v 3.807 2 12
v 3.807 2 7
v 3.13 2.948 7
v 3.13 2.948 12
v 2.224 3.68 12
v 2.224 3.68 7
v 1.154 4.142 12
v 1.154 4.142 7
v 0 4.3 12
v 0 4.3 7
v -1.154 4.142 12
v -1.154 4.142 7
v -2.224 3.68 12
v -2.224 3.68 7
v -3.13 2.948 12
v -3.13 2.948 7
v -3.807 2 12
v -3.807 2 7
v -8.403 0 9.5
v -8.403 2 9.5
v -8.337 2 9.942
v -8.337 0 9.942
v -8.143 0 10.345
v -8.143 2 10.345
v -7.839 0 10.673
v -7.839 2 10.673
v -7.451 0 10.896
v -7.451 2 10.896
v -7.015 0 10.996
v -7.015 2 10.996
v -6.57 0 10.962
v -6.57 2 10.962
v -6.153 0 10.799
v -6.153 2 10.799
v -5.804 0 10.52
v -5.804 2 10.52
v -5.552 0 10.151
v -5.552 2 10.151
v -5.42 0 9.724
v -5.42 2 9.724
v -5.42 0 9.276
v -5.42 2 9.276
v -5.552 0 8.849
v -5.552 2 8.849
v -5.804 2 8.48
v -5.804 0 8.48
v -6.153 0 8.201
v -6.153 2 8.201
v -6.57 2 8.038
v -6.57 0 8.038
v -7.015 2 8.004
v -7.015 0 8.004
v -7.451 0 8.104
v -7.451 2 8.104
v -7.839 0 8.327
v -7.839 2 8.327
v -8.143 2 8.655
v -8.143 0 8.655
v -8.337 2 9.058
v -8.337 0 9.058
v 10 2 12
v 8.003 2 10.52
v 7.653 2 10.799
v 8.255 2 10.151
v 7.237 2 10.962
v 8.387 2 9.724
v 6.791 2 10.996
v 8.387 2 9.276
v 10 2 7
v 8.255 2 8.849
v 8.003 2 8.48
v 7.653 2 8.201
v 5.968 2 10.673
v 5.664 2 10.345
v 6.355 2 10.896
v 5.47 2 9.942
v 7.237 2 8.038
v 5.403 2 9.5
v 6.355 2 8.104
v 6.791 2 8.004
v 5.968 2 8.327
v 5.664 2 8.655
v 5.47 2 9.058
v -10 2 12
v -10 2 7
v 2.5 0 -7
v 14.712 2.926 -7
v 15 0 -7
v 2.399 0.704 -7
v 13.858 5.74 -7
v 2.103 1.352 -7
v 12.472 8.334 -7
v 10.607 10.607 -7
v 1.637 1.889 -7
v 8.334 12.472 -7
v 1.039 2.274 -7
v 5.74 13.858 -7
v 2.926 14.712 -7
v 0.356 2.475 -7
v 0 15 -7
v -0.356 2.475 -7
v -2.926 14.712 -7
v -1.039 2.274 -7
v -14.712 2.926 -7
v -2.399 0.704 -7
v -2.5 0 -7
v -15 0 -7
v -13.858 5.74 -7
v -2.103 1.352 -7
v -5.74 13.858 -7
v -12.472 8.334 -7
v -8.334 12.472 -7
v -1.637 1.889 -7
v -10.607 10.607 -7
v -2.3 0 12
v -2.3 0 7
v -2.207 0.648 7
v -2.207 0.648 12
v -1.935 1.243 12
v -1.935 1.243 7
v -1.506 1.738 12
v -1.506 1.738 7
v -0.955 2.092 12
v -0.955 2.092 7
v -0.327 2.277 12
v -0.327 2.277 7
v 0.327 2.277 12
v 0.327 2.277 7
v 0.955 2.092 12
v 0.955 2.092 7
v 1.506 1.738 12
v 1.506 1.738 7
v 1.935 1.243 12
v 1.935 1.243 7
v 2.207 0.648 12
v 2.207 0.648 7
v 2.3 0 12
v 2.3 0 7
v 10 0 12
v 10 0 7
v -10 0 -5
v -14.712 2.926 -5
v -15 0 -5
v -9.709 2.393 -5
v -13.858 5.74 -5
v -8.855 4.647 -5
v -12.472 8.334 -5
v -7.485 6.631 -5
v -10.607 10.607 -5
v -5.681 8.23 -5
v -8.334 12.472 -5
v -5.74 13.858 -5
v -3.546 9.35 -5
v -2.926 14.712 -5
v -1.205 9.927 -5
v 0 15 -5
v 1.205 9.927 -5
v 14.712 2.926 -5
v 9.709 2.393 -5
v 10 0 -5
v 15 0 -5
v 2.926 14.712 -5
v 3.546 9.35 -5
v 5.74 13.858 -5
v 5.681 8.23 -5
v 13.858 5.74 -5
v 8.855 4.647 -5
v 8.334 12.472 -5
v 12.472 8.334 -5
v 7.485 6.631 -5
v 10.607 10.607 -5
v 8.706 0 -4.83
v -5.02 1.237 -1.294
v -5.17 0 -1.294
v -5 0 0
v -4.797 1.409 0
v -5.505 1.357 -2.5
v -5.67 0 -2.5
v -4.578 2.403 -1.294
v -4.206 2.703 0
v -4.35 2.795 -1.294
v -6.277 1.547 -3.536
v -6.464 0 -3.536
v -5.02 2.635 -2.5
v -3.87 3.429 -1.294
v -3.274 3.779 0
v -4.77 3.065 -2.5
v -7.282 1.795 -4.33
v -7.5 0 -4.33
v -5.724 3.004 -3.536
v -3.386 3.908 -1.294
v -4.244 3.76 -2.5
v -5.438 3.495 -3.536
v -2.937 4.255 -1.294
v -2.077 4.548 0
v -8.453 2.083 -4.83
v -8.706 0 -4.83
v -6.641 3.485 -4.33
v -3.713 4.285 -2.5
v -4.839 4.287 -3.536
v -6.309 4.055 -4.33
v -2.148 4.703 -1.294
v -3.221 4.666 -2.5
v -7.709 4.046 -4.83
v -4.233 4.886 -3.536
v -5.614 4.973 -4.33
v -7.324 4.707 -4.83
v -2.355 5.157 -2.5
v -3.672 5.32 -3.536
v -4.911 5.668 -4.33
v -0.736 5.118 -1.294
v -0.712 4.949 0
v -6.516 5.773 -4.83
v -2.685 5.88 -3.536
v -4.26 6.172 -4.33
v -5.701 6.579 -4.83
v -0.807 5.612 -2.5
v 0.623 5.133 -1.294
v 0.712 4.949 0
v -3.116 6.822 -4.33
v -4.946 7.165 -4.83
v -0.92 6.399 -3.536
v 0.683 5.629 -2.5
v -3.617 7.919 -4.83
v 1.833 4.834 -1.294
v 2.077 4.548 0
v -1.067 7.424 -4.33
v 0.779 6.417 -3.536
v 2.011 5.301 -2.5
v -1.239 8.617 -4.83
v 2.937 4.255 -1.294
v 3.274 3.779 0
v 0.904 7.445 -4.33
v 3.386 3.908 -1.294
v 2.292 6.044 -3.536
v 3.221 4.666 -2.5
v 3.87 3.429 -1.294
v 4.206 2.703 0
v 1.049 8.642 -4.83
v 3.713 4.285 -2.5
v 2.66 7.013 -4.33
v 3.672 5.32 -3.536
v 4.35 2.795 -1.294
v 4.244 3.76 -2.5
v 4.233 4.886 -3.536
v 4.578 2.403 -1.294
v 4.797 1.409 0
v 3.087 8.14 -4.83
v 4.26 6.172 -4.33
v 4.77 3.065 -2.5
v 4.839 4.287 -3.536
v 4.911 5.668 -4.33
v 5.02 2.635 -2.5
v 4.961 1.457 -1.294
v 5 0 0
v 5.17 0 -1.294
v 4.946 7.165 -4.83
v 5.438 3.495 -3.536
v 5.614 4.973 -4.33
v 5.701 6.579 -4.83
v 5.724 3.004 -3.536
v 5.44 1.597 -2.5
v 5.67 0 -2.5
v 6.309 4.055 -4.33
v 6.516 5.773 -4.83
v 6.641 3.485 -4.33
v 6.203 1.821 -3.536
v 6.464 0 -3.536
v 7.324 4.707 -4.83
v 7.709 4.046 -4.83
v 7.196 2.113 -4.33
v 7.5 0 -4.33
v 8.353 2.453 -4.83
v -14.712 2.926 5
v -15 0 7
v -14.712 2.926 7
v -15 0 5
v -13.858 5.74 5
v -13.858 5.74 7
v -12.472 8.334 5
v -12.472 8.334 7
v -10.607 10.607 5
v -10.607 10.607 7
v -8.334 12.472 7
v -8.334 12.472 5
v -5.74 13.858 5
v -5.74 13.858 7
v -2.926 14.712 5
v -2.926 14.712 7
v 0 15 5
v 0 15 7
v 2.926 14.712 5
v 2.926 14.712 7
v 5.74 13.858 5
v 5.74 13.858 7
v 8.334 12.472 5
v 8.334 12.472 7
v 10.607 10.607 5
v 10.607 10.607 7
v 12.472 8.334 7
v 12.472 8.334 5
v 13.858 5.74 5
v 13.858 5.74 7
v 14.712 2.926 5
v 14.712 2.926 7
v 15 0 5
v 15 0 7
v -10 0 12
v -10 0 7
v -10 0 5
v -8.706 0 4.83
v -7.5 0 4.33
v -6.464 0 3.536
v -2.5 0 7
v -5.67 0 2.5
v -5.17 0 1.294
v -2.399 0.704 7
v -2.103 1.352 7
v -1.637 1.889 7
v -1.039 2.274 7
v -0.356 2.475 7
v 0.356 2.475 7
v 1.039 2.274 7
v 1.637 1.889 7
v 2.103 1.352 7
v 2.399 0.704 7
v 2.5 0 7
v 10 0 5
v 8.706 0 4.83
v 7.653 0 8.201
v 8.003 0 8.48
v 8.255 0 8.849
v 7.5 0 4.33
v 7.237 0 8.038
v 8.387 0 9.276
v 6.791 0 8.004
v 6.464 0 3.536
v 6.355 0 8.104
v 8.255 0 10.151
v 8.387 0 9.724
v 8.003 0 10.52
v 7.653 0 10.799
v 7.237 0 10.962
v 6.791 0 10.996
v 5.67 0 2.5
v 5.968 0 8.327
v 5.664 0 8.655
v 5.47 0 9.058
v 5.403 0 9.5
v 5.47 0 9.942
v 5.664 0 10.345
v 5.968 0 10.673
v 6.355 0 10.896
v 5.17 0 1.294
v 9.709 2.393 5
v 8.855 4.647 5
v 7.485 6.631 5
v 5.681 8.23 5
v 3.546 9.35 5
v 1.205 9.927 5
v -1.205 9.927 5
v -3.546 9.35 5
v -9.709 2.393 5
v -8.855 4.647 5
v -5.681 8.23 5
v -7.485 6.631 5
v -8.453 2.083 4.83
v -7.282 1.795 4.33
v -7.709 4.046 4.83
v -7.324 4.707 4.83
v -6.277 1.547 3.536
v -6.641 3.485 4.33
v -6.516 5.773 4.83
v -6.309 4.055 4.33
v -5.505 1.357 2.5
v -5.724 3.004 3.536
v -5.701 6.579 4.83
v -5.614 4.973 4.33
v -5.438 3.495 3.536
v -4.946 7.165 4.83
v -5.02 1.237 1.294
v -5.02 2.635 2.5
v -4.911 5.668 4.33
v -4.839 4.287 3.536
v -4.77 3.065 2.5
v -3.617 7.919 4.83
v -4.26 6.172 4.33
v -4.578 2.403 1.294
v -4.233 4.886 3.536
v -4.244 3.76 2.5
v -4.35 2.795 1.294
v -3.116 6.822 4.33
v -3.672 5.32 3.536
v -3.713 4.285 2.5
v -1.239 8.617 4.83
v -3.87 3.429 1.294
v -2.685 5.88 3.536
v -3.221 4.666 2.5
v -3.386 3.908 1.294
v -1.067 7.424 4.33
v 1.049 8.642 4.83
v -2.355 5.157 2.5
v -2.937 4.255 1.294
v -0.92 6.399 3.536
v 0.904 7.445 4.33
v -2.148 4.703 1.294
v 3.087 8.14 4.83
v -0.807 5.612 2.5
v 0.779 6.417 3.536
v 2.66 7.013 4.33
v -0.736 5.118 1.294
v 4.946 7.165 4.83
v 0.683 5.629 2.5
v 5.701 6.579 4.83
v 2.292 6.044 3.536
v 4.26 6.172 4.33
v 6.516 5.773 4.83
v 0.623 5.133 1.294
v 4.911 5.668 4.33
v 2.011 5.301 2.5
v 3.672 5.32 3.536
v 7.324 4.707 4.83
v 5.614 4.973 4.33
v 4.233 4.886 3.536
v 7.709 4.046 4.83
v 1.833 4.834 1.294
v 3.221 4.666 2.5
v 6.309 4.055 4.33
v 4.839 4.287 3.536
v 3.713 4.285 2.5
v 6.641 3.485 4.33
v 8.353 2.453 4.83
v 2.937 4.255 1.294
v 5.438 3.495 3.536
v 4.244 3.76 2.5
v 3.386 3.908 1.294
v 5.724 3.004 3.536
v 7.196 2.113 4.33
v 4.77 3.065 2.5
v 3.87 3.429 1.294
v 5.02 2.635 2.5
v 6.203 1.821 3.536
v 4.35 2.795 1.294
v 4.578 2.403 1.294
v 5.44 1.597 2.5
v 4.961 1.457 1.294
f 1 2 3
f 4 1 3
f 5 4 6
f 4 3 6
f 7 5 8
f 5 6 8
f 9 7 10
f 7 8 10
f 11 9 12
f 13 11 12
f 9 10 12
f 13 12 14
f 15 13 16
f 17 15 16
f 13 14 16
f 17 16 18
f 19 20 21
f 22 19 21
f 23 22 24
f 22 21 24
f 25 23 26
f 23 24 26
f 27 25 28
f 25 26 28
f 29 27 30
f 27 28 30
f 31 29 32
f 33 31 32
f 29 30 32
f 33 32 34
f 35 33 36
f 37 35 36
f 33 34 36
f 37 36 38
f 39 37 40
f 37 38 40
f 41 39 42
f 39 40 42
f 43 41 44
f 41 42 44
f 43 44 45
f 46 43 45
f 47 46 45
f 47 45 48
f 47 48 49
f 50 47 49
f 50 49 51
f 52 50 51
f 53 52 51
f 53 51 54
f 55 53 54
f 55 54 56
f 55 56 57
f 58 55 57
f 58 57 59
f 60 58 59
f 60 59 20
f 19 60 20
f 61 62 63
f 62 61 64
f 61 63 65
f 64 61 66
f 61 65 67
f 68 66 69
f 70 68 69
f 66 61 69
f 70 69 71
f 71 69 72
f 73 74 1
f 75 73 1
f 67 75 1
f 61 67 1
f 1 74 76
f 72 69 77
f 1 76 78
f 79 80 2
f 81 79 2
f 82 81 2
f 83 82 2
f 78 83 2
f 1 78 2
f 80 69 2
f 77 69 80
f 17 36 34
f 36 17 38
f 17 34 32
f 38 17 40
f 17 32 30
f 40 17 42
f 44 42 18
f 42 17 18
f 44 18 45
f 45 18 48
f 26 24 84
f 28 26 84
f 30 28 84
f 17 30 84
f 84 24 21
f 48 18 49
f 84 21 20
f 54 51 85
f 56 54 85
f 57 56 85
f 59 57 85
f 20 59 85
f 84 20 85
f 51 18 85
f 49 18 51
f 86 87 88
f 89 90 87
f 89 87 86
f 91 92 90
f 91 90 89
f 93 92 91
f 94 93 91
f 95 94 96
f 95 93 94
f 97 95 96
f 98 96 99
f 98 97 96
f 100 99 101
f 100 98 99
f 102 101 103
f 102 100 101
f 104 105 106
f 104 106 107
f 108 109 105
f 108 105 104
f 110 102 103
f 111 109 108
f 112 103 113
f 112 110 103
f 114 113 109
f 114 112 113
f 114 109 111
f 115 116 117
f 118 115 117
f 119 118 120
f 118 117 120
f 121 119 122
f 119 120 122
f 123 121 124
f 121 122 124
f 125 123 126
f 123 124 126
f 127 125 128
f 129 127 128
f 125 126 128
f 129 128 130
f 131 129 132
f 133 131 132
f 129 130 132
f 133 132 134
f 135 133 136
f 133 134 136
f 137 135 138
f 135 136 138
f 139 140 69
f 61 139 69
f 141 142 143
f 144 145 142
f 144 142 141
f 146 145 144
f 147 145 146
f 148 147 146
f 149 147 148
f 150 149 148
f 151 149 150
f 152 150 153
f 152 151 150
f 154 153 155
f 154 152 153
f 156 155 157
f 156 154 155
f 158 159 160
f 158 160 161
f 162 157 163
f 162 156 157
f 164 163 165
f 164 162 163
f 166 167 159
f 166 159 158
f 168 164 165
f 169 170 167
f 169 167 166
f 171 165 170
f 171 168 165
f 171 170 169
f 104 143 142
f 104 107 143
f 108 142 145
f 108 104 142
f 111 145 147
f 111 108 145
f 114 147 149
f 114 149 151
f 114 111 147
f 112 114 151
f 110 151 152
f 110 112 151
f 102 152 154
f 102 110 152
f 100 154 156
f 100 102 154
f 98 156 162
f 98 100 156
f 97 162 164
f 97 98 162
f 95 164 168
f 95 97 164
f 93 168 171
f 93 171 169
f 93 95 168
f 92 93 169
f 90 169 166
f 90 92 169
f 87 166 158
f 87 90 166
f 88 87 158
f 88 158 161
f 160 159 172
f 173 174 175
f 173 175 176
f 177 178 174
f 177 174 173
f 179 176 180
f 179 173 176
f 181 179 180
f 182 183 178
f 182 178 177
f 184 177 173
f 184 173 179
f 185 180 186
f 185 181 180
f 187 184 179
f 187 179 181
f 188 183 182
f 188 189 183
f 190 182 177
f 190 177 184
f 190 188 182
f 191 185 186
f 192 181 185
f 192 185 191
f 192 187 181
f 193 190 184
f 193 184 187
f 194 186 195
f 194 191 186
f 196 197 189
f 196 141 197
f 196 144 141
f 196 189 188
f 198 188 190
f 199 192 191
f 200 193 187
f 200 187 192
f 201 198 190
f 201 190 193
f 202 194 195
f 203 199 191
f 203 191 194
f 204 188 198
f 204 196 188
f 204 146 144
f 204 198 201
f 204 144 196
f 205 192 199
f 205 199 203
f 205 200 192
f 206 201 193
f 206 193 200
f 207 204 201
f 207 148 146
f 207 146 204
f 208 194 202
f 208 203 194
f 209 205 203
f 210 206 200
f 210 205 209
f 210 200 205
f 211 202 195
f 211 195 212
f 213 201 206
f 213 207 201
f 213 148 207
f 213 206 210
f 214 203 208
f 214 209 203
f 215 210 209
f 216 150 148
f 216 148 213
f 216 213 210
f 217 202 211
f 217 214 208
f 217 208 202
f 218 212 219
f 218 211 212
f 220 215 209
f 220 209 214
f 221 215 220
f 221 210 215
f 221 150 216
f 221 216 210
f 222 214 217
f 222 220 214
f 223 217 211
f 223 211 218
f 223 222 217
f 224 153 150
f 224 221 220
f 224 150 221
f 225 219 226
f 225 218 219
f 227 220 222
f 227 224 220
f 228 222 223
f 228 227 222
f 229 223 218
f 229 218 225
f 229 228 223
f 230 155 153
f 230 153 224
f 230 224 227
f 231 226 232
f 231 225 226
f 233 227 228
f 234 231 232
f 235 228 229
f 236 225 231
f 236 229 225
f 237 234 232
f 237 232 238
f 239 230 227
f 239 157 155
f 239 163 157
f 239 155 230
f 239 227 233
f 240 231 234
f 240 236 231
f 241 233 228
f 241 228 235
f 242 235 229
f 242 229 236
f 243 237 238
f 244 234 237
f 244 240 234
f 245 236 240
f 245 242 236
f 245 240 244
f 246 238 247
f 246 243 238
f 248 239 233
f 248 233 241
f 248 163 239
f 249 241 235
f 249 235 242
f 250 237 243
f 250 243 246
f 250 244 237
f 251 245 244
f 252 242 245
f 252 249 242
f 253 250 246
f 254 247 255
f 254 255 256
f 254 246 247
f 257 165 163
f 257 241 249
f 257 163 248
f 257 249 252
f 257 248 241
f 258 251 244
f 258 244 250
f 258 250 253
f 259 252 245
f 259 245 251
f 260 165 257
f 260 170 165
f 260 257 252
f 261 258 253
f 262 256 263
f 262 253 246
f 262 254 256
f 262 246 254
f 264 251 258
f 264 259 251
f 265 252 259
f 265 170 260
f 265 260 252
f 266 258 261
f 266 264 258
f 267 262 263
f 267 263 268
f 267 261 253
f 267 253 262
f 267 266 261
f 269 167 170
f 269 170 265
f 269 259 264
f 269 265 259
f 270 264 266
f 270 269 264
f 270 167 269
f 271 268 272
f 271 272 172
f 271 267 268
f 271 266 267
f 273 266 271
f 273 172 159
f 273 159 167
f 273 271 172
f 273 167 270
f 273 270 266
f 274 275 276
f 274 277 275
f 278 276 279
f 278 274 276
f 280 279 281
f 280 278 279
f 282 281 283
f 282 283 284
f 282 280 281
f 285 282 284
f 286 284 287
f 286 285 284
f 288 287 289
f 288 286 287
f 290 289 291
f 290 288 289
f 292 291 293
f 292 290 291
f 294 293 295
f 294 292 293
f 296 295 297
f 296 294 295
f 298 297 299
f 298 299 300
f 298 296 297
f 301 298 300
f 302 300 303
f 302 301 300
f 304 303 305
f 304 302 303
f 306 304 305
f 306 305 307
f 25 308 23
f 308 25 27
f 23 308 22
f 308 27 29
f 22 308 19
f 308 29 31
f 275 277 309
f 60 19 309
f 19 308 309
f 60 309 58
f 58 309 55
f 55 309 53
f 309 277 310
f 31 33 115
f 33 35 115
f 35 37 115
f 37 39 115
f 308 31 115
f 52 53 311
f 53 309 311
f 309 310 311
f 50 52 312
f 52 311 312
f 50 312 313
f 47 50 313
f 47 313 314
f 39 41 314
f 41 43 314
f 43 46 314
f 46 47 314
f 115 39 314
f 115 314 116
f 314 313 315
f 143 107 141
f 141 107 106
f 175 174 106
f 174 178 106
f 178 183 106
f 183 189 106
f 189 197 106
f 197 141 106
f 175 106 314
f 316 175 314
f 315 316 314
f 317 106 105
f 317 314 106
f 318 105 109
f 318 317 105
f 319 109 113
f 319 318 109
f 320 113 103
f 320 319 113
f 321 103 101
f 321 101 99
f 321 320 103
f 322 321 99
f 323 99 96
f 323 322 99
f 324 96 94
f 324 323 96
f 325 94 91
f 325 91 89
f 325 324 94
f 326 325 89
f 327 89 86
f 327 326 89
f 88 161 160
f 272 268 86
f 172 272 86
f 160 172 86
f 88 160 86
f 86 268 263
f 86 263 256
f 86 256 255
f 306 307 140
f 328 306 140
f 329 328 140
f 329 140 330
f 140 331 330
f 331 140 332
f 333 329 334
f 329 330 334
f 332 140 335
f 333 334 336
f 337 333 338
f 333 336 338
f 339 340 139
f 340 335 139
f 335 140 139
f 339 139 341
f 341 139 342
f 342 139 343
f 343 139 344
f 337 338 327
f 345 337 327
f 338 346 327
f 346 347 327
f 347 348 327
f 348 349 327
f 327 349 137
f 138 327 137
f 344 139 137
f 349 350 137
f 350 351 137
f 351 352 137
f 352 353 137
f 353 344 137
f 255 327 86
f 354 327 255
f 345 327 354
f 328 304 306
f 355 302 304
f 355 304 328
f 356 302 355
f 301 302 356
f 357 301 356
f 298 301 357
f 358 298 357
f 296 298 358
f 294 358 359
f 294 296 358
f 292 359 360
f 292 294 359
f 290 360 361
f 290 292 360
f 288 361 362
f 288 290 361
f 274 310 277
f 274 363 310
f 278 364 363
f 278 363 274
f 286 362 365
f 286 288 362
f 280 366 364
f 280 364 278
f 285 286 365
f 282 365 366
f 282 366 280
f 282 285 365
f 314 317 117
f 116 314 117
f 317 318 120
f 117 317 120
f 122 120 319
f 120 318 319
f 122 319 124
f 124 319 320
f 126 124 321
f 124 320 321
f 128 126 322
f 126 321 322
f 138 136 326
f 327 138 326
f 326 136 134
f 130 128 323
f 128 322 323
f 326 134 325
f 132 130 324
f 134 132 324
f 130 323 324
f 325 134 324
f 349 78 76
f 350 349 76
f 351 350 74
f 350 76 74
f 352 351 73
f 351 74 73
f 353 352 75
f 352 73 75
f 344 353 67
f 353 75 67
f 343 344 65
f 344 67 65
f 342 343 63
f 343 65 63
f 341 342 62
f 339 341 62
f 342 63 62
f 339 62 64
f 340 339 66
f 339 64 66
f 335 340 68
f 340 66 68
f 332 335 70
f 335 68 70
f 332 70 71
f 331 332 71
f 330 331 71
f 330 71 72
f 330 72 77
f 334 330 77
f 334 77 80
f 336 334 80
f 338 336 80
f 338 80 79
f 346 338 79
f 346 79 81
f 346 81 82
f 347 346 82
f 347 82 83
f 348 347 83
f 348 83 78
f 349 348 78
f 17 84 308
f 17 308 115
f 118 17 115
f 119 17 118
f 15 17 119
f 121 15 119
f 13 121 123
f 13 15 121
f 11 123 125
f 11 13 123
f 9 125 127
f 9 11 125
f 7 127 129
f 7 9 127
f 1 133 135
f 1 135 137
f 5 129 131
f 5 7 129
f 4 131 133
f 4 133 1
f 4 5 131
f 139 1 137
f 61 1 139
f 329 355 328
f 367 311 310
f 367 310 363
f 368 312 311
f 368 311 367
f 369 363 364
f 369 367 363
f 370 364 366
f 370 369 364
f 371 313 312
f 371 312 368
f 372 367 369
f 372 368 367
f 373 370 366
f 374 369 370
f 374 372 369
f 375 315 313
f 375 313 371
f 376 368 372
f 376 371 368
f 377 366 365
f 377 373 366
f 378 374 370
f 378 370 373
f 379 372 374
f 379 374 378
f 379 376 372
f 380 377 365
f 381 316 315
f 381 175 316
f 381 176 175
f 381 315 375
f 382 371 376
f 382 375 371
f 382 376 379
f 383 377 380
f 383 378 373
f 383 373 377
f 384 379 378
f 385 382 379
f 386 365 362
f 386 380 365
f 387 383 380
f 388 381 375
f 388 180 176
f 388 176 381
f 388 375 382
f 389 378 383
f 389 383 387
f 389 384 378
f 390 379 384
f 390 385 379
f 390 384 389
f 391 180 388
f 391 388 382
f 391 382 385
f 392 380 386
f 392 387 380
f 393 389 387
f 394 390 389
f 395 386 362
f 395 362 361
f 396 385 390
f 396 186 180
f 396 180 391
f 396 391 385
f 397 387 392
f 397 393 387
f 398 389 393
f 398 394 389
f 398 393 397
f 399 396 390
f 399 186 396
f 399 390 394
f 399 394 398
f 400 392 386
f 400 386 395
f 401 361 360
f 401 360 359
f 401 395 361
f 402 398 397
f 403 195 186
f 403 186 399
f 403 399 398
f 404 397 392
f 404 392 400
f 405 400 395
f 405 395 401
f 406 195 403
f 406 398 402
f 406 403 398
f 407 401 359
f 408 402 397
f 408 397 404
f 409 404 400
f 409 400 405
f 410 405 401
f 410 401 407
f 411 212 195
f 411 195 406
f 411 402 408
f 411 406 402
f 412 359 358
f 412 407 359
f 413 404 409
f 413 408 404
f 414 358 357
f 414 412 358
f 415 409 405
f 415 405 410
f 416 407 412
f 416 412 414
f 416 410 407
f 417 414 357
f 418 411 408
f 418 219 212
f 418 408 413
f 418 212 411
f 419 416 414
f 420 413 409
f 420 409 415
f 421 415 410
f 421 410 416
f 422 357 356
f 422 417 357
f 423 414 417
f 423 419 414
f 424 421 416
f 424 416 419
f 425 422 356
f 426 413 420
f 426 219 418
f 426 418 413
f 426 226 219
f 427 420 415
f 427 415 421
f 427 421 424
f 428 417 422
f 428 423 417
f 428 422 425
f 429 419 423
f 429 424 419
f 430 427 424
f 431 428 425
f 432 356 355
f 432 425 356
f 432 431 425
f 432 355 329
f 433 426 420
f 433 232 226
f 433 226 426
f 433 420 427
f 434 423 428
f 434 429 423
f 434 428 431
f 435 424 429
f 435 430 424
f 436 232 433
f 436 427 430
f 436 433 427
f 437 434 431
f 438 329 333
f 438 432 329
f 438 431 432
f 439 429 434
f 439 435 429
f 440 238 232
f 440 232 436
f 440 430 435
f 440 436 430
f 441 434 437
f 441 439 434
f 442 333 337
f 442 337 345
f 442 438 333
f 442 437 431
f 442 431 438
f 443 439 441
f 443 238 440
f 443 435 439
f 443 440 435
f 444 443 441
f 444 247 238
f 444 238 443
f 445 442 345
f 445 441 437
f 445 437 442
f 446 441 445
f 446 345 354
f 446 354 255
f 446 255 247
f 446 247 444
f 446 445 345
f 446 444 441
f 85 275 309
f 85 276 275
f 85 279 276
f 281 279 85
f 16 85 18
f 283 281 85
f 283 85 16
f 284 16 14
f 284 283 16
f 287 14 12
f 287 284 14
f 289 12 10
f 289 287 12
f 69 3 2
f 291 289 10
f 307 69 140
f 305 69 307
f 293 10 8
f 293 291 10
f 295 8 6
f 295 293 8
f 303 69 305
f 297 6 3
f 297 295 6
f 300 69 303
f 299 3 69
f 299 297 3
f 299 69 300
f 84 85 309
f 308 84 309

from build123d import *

# Parameters (mm, degrees)
F1_ANGLE = 180
F3_DEPTH = 5
F4_R     = 1.5
F5_DEPTH = 2.001
F6_R     = 4.99999


# Not quite as in the source:
# - a fillet or chamfer is up to 0.001 mm smaller than in the source, because OpenCascade refuses the exact size


with BuildPart() as f1:
    # F0 (on Front) → F1 (revolve)
    with BuildSketch(Plane.XZ):
        Polygon((-2.5, -7), (-2.5, 7), (-15, 7), (-15, 5), (-5, 5), (-5, -5), (-15, -5), (-15, -7), align=None)
    revolve(axis=Axis((0, 0, 0.6770828075), (0, 0, -1)), revolution_arc=F1_ANGLE)

    # F2 (on face) → F3 (join)
    with BuildSketch(Plane.XY.offset(7)):
        with BuildLine():
            Line((-10, 2), (-10, 0))
            Line((-10, 0), (-2.3, 0))
            ThreePointArc((-2.3, 0), (0, 2.3), (2.3, 0))
            Line((2.3, 0), (10, 0))
            Line((10, 0), (10, 2))
            Line((10, 2), (3.8065732621, 2))
            ThreePointArc((3.8065732621, 2), (0, 4.3), (-3.8065732621, 2))
            Line((-3.8065732621, 2), (-10, 2))
        make_face()
    extrude(amount=F3_DEPTH)

    # F4 (on face) → F5 (cut, through all)
    with BuildSketch(Plane(origin=(0, 2, 0), x_dir=(-1, 0, 0), z_dir=(0, 1, 0))):
        with Locations((6.9032866311, 9.5)):
            Circle(F4_R)
        with Locations((-6.9032866311, 9.5)):
            Circle(F4_R)
    extrude(amount=-F5_DEPTH, mode=Mode.SUBTRACT)

    # F6 (radius 5 in the source; OpenCascade refuses exactly that, so slightly less here)
    f6_edges = [f1.edges().sort_by_distance(p)[0] for p in [
        (0, 5, 5),
        (0, 5, -5),
    ]]
    fillet(f6_edges, radius=F6_R)


solid = f1.part
